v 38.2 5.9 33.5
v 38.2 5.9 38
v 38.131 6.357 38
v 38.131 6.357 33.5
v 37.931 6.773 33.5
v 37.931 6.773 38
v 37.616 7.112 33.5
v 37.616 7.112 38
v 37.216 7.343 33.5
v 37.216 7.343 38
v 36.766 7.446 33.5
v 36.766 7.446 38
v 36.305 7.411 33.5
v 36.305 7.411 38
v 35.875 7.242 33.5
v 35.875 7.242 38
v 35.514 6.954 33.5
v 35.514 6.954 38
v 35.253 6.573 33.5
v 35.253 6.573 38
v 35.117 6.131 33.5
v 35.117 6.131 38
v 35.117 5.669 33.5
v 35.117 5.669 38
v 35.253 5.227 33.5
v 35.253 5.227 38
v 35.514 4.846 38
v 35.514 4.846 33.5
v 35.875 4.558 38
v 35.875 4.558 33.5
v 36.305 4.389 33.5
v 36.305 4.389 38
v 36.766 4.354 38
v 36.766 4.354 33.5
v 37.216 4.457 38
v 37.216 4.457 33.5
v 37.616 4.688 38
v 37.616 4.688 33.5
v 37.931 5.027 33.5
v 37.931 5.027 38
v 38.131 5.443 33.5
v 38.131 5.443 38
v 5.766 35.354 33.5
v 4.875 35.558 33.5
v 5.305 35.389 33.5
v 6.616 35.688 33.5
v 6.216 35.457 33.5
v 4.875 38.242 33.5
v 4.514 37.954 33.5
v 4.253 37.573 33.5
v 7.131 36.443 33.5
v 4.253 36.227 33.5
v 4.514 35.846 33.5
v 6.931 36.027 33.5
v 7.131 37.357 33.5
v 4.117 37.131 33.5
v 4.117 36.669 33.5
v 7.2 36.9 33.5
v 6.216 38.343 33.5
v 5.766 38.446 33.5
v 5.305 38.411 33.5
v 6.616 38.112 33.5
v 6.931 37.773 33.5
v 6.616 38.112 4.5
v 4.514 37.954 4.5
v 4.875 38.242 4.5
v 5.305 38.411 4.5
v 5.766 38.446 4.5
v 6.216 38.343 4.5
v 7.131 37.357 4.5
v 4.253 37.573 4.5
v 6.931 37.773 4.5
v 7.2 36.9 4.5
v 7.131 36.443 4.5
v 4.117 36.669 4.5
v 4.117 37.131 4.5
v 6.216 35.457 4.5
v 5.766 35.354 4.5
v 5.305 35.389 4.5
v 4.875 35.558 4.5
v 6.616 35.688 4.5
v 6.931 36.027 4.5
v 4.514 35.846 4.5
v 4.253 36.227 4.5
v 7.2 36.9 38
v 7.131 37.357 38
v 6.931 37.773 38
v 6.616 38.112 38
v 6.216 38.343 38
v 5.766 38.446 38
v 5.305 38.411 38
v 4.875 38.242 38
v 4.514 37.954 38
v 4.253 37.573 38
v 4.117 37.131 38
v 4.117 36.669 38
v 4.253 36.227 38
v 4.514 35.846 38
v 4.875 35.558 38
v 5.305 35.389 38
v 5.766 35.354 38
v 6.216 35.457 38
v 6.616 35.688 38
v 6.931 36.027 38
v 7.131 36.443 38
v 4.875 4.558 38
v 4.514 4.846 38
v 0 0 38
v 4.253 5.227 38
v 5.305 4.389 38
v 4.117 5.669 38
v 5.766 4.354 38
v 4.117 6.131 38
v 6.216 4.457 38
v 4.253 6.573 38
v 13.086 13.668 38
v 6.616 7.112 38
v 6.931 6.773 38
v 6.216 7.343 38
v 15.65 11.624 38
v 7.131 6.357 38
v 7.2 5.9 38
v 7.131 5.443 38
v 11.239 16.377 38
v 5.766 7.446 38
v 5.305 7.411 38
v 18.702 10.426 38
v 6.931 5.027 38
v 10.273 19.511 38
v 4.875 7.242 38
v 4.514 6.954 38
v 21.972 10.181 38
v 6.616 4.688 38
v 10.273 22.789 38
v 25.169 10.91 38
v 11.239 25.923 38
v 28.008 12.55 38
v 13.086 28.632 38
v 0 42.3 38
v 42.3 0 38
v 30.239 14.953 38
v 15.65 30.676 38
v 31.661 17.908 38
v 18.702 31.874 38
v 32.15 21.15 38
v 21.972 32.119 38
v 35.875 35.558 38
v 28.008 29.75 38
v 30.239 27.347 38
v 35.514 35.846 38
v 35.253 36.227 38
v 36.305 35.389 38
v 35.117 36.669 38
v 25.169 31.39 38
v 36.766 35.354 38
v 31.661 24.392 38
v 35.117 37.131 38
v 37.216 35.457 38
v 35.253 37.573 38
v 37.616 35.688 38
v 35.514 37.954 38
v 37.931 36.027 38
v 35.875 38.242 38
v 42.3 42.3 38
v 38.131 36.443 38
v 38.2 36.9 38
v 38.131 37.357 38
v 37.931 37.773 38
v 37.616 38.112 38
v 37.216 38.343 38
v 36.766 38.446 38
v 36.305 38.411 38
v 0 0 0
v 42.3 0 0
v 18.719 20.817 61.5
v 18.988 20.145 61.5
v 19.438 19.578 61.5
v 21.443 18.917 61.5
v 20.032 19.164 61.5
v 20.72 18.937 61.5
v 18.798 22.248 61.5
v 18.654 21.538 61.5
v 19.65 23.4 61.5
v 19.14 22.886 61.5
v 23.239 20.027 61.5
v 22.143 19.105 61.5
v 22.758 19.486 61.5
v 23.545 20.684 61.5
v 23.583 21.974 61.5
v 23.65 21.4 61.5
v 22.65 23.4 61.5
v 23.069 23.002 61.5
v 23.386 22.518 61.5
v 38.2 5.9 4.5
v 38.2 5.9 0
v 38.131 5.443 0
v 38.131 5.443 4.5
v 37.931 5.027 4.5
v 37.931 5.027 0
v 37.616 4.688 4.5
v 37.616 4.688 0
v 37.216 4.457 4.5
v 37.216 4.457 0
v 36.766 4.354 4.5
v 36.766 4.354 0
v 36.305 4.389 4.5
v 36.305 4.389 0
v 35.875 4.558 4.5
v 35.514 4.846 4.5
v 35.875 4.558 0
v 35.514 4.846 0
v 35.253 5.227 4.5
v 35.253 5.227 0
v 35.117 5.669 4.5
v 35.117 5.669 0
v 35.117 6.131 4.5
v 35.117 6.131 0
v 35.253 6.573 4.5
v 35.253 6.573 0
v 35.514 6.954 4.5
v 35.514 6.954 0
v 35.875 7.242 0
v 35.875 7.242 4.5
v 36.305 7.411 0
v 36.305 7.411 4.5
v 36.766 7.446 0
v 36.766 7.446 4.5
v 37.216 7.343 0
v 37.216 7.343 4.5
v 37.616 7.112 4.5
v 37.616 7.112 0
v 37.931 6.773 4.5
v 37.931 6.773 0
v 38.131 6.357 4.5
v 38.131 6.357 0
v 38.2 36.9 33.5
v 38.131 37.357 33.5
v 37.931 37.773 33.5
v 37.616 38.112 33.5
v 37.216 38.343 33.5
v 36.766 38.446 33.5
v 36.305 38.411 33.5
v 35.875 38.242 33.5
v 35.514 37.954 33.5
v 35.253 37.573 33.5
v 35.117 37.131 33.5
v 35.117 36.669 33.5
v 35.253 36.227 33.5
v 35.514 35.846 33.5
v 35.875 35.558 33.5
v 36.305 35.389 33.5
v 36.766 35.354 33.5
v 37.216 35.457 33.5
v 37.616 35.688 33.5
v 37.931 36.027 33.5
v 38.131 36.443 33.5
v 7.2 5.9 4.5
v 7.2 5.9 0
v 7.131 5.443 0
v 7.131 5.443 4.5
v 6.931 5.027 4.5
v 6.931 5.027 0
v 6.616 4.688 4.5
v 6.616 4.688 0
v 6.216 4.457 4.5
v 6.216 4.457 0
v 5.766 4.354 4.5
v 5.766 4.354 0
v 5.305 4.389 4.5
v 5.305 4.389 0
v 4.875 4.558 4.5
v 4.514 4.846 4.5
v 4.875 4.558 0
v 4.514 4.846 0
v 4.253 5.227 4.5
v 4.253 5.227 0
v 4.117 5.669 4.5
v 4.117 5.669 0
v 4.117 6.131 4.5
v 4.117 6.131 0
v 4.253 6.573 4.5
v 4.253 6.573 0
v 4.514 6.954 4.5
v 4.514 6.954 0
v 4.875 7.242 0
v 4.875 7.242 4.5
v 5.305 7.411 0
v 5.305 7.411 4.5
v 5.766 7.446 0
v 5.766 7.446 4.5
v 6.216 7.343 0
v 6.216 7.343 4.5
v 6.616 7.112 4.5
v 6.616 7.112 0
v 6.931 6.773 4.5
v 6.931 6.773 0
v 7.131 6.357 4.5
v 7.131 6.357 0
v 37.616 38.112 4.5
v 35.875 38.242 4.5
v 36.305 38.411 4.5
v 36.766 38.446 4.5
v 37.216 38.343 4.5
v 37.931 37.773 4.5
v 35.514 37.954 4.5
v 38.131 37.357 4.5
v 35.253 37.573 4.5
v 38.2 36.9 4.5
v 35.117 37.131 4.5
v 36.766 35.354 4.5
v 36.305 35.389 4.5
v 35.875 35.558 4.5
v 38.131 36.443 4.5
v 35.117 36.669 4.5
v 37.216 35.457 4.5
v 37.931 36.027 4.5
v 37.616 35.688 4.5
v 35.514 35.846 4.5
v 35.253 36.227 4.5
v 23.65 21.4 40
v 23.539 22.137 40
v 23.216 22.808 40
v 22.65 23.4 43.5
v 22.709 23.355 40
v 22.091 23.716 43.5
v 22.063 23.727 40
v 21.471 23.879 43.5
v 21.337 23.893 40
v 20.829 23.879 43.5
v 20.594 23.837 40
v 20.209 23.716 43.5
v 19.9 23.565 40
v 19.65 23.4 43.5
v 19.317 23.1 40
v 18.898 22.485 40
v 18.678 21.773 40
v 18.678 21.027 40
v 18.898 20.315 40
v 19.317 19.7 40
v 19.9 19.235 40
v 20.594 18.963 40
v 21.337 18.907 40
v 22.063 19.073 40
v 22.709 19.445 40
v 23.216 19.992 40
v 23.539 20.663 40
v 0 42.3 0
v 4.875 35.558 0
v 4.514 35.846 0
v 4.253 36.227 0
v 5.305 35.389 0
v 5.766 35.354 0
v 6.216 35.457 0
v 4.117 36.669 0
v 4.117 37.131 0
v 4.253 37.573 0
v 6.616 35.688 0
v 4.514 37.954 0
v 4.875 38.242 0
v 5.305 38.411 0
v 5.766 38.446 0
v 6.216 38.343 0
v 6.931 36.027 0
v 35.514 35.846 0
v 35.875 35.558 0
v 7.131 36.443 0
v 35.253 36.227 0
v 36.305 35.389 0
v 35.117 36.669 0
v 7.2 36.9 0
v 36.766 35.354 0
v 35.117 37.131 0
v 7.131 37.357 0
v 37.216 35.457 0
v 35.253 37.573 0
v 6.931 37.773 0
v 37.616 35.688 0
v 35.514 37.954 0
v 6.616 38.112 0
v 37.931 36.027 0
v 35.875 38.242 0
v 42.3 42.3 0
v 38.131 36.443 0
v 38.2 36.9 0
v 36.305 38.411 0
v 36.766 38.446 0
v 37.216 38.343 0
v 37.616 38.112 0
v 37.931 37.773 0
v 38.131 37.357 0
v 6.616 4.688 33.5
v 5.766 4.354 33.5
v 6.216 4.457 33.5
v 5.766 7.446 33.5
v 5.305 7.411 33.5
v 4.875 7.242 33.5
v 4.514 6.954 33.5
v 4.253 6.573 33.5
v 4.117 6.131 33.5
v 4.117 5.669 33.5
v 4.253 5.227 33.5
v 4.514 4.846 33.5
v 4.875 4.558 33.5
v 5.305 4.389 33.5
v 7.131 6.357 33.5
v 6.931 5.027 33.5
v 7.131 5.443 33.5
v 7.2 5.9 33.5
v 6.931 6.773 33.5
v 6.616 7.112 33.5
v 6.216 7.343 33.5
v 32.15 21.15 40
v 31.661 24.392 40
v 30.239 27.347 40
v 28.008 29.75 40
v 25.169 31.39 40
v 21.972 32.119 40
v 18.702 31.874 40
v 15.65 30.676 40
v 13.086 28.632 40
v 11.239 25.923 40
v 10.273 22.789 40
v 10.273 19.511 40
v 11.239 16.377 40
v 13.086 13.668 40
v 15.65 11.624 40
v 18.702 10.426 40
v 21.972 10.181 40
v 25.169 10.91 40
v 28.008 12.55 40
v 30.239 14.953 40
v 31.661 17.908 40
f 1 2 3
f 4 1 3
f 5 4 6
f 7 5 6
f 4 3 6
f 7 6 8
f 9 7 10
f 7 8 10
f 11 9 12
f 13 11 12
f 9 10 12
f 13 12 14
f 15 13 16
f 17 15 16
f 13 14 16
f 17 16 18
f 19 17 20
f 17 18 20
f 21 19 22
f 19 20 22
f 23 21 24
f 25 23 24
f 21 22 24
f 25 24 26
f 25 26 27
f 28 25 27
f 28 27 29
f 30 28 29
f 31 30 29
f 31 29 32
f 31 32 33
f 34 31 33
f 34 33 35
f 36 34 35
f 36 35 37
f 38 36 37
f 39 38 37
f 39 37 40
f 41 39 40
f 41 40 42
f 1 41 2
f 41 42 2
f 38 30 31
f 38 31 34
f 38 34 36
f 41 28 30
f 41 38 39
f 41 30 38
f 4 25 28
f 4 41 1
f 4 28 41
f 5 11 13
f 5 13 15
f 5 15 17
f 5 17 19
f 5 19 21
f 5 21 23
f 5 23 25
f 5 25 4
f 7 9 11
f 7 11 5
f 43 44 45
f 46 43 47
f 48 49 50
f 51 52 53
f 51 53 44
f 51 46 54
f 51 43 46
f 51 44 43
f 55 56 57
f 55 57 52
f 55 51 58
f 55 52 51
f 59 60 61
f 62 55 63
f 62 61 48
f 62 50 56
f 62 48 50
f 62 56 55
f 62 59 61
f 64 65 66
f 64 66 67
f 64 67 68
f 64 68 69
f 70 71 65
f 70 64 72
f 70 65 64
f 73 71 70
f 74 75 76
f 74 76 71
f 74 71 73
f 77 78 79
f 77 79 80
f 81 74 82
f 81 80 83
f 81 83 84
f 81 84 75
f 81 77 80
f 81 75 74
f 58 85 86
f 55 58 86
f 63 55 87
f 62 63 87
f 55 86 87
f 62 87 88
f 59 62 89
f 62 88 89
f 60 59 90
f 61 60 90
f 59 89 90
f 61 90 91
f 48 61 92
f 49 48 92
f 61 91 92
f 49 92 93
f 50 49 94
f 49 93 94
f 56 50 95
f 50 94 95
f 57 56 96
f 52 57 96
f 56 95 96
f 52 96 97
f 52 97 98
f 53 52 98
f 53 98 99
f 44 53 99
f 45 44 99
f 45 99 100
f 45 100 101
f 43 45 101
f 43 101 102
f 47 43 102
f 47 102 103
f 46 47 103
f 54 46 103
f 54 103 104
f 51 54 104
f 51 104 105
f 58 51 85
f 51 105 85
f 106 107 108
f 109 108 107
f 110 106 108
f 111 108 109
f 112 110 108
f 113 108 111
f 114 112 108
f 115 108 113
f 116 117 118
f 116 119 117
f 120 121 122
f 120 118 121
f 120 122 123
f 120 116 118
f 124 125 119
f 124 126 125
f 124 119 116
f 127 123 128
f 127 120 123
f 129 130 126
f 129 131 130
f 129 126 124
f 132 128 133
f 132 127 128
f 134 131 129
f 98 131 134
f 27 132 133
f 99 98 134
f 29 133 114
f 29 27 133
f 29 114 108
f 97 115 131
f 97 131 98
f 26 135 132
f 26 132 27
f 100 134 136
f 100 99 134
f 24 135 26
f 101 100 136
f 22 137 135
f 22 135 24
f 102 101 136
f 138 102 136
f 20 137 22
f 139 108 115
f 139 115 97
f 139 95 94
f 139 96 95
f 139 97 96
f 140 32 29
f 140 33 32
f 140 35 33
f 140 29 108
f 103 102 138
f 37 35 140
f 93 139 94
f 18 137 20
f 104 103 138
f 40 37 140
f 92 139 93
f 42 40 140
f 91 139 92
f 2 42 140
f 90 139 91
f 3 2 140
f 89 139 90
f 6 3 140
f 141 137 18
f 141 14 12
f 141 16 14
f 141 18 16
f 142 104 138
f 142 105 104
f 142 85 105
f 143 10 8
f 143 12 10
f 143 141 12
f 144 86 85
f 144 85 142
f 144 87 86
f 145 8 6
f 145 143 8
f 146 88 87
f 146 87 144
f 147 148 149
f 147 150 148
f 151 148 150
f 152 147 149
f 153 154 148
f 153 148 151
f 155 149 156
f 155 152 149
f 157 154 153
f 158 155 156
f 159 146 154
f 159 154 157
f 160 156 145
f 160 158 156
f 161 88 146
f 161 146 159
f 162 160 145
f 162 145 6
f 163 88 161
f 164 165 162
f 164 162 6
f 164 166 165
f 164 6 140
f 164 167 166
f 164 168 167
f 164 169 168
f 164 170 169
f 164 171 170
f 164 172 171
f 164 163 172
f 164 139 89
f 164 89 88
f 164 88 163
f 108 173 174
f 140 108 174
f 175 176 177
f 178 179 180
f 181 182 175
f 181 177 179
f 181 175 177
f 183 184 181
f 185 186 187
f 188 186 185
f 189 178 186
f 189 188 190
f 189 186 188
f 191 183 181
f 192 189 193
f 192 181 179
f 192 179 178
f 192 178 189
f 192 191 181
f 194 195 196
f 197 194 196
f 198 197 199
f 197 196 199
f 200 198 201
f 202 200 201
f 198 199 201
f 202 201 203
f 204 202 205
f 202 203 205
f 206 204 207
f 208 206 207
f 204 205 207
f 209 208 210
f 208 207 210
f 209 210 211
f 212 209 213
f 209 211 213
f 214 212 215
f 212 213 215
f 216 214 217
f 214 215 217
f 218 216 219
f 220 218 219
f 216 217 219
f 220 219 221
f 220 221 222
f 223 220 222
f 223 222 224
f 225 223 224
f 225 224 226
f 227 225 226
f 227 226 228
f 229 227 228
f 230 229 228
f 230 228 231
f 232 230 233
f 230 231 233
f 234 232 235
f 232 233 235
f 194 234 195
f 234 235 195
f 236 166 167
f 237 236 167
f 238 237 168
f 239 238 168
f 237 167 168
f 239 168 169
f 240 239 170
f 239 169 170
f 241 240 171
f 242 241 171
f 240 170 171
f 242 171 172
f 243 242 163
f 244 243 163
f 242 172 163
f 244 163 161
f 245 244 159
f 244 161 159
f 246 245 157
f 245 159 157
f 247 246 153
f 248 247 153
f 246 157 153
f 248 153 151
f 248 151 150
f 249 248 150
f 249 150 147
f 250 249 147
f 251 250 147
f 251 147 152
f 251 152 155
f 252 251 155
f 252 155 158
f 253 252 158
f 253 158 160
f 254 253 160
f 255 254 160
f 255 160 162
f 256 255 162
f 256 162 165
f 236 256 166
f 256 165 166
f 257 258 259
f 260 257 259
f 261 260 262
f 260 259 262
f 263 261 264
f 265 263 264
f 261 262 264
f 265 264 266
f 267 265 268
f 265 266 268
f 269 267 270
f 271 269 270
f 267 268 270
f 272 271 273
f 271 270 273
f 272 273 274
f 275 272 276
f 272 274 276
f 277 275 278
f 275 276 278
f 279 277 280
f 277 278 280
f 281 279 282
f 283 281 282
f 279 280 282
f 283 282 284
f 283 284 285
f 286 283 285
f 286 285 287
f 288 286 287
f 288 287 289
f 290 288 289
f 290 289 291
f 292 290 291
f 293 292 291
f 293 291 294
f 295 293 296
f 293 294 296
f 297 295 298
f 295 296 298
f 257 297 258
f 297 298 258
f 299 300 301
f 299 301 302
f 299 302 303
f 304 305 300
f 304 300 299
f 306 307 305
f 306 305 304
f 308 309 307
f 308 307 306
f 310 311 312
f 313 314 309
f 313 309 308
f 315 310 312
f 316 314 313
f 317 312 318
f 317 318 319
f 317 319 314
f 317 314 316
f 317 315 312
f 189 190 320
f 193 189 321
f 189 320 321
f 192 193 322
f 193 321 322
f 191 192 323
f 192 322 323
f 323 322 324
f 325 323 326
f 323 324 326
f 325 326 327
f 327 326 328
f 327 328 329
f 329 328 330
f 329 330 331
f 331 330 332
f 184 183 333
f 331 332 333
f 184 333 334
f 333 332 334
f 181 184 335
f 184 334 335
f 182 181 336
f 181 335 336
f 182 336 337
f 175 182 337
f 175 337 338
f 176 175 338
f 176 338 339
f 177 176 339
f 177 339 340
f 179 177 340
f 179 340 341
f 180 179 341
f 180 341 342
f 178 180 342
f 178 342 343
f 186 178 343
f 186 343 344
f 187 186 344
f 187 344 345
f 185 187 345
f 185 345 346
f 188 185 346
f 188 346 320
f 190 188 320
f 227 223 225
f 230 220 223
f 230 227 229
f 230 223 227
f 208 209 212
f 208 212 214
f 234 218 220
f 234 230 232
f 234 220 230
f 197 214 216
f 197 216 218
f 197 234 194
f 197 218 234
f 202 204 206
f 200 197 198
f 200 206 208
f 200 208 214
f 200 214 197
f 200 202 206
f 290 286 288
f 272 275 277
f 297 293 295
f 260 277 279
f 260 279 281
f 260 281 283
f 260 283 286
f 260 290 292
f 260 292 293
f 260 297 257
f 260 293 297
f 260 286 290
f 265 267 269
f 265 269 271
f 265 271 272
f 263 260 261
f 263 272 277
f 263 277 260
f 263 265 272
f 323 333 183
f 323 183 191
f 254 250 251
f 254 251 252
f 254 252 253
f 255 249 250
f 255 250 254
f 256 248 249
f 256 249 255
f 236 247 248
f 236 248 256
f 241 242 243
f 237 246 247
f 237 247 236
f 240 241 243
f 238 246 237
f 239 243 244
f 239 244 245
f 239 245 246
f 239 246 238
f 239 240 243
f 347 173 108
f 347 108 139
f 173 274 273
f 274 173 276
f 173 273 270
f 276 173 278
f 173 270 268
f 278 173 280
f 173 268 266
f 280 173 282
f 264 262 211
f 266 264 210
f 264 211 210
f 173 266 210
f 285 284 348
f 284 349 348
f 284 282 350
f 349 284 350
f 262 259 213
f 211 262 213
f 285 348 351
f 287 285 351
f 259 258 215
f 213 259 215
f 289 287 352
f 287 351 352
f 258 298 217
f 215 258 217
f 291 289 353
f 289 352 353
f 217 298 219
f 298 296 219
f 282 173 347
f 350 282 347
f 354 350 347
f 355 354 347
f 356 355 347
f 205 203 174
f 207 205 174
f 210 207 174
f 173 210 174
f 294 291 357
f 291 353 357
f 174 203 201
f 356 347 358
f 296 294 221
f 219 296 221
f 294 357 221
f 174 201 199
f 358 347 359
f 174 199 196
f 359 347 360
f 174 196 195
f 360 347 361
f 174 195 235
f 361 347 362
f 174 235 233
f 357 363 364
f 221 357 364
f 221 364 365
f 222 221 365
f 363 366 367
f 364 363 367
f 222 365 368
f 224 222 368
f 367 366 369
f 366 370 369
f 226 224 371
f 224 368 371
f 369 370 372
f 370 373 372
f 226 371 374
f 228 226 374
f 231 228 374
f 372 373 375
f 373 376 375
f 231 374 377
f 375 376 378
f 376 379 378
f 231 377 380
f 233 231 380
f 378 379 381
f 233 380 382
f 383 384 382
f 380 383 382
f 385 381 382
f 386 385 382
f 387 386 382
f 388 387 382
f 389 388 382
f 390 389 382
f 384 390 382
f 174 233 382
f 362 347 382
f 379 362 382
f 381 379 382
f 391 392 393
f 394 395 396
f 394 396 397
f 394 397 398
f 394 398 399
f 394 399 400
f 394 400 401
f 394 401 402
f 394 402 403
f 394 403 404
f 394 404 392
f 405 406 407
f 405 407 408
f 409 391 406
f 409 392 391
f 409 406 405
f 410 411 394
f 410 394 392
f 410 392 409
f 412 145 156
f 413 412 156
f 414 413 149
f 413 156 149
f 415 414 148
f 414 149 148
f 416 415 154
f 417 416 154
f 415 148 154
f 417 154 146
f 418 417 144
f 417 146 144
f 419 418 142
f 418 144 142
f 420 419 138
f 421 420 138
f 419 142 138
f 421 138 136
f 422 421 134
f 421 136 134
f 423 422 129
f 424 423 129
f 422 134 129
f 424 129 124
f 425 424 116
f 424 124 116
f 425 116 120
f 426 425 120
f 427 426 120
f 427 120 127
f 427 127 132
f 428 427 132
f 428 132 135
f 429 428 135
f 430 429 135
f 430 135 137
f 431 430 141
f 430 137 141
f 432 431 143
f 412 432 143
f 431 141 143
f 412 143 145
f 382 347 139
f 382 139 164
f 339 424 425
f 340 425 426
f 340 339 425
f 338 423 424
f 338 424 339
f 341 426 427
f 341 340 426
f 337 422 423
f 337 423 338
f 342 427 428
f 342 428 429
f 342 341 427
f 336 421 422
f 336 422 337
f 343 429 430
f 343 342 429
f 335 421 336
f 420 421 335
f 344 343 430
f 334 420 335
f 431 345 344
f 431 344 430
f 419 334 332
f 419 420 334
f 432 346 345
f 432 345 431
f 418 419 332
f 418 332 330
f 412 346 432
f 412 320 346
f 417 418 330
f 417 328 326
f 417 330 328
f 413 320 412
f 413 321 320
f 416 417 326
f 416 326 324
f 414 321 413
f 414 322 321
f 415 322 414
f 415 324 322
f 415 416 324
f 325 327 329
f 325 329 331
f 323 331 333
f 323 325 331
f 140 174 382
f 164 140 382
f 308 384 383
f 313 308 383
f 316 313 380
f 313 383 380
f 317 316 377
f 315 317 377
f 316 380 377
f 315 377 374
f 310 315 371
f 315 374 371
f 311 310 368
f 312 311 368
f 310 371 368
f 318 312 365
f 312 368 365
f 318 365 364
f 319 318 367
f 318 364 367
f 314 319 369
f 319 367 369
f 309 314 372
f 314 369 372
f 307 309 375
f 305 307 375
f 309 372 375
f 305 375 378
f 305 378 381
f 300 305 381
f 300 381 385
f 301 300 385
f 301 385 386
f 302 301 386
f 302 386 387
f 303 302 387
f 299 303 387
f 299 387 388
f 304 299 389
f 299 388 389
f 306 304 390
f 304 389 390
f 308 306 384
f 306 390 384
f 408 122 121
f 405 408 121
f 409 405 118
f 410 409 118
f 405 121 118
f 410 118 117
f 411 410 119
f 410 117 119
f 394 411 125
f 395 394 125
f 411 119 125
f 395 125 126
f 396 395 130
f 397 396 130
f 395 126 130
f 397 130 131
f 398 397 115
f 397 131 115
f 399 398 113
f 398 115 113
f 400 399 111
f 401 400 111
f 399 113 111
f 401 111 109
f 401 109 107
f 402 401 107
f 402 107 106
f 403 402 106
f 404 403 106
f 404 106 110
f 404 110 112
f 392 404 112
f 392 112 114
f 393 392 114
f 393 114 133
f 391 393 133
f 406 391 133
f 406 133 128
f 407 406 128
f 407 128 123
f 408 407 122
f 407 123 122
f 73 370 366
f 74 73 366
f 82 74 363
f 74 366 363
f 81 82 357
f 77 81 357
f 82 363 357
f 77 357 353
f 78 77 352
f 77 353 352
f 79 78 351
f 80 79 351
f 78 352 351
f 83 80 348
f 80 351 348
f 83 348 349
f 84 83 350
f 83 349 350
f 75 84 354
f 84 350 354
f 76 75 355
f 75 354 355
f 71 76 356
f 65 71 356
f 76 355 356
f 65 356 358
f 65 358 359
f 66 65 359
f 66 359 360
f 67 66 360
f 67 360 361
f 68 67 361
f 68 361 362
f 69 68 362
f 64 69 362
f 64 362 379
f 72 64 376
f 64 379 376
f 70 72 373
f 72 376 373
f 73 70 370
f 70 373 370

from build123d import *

# Parameters (mm, degrees)
SKETCH1_W           = 42.3
SKETCH1_H           = 42.3
BOSS_EXTRUDE1_DEPTH = 38
SKETCH2_R           = 11
BOSS_EXTRUDE2_DEPTH = 2
SKETCH3_R           = 2.5
BOSS_EXTRUDE4_DEPTH = 21.5
CUT_EXTRUDE1_START  = -18
CUT_EXTRUDE1_DEPTH  = 18
SKETCH5_R           = 1.55
CUT_EXTRUDE2_DEPTH  = 4.5
SKETCH6_OUTSIDE_W   = 61.46
SKETCH6_OUTSIDE_H   = 61.46
SKETCH6_OUTSIDE_W_2 = 42.3
SKETCH6_OUTSIDE_H_2 = 42.3
SKETCH6_OUTSIDE_R   = 1.55
CUT_EXTRUDE3_DEPTH  = 4.5


with BuildPart() as part:
    # Sketch1 → Boss-Extrude1 (new body)
    with BuildSketch(Plane.XY):
        with Locations((21.15, 21.15)):
            Rectangle(SKETCH1_W, SKETCH1_H)
    extrude(amount=BOSS_EXTRUDE1_DEPTH)

    # Sketch2 → Boss-Extrude2 (add)
    with BuildSketch(Plane.XY.offset(38)):
        with Locations((21.15, 21.15)):
            Circle(SKETCH2_R)
    extrude(amount=BOSS_EXTRUDE2_DEPTH)

    # Sketch3 → Boss-Extrude4 (add)
    with BuildSketch(Plane.XY.offset(40)):
        with Locations((21.15, 21.4)):
            Circle(SKETCH3_R)
    extrude(amount=BOSS_EXTRUDE4_DEPTH)

    # Sketch4 → Cut-Extrude1 (cut)
    with BuildSketch(Plane.XY.offset(61.5).offset(CUT_EXTRUDE1_START)):
        with BuildLine():
            Line((21.15, 23.4), (22.65, 23.4))
            ThreePointArc((22.65, 23.4), (21.15, 23.9), (19.65, 23.4))
            Line((19.65, 23.4), (21.15, 23.4))
        make_face()
    extrude(amount=CUT_EXTRUDE1_DEPTH, mode=Mode.SUBTRACT)

    # Sketch5 → Cut-Extrude2 (cut)
    with BuildSketch(Plane.XY.offset(38)):
        with Locations((5.65, 36.9)):
            Circle(SKETCH5_R)
        with Locations((36.65, 36.9)):
            Circle(SKETCH5_R)
        with Locations((36.65, 5.9)):
            Circle(SKETCH5_R)
        with Locations((5.65, 5.9)):
            Circle(SKETCH5_R)
    extrude(amount=-CUT_EXTRUDE2_DEPTH, mode=Mode.SUBTRACT)

    # Sketch6 outside → Cut-Extrude3 (cut)
    # profile 1 of 5: a face of its own
    with BuildSketch(Plane(origin=(0, 0, 0), x_dir=(-1, 0, 0), z_dir=(0, 0, -1))):
        with Locations((-21.15, 21.15)):
            Rectangle(SKETCH6_OUTSIDE_W, SKETCH6_OUTSIDE_H)
        with Locations((-21.15, 21.15)):
            Rectangle(SKETCH6_OUTSIDE_W_2, SKETCH6_OUTSIDE_H_2, mode=Mode.SUBTRACT)
    # profile 2 of 5: a face of its own
    with BuildSketch(Plane(origin=(0, 0, 0), x_dir=(-1, 0, 0), z_dir=(0, 0, -1))):
        with Locations(Location((-5.65, 36.9, 0), (0, 0, 180))):
            Circle(SKETCH6_OUTSIDE_R)
    # profile 3 of 5: a face of its own
    with BuildSketch(Plane(origin=(0, 0, 0), x_dir=(-1, 0, 0), z_dir=(0, 0, -1))):
        with Locations(Location((-36.65, 36.9, 0), (0, 0, 180))):
            Circle(SKETCH6_OUTSIDE_R)
    # profile 4 of 5: a face of its own
    with BuildSketch(Plane(origin=(0, 0, 0), x_dir=(-1, 0, 0), z_dir=(0, 0, -1))):
        with Locations(Location((-36.65, 5.9, 0), (0, 0, 180))):
            Circle(SKETCH6_OUTSIDE_R)
    # profile 5 of 5: a face of its own
    with BuildSketch(Plane(origin=(0, 0, 0), x_dir=(-1, 0, 0), z_dir=(0, 0, -1))):
        with Locations(Location((-5.65, 5.9, 0), (0, 0, 180))):
            Circle(SKETCH6_OUTSIDE_R)
    extrude(amount=-CUT_EXTRUDE3_DEPTH, mode=Mode.SUBTRACT)


solid = part.part
